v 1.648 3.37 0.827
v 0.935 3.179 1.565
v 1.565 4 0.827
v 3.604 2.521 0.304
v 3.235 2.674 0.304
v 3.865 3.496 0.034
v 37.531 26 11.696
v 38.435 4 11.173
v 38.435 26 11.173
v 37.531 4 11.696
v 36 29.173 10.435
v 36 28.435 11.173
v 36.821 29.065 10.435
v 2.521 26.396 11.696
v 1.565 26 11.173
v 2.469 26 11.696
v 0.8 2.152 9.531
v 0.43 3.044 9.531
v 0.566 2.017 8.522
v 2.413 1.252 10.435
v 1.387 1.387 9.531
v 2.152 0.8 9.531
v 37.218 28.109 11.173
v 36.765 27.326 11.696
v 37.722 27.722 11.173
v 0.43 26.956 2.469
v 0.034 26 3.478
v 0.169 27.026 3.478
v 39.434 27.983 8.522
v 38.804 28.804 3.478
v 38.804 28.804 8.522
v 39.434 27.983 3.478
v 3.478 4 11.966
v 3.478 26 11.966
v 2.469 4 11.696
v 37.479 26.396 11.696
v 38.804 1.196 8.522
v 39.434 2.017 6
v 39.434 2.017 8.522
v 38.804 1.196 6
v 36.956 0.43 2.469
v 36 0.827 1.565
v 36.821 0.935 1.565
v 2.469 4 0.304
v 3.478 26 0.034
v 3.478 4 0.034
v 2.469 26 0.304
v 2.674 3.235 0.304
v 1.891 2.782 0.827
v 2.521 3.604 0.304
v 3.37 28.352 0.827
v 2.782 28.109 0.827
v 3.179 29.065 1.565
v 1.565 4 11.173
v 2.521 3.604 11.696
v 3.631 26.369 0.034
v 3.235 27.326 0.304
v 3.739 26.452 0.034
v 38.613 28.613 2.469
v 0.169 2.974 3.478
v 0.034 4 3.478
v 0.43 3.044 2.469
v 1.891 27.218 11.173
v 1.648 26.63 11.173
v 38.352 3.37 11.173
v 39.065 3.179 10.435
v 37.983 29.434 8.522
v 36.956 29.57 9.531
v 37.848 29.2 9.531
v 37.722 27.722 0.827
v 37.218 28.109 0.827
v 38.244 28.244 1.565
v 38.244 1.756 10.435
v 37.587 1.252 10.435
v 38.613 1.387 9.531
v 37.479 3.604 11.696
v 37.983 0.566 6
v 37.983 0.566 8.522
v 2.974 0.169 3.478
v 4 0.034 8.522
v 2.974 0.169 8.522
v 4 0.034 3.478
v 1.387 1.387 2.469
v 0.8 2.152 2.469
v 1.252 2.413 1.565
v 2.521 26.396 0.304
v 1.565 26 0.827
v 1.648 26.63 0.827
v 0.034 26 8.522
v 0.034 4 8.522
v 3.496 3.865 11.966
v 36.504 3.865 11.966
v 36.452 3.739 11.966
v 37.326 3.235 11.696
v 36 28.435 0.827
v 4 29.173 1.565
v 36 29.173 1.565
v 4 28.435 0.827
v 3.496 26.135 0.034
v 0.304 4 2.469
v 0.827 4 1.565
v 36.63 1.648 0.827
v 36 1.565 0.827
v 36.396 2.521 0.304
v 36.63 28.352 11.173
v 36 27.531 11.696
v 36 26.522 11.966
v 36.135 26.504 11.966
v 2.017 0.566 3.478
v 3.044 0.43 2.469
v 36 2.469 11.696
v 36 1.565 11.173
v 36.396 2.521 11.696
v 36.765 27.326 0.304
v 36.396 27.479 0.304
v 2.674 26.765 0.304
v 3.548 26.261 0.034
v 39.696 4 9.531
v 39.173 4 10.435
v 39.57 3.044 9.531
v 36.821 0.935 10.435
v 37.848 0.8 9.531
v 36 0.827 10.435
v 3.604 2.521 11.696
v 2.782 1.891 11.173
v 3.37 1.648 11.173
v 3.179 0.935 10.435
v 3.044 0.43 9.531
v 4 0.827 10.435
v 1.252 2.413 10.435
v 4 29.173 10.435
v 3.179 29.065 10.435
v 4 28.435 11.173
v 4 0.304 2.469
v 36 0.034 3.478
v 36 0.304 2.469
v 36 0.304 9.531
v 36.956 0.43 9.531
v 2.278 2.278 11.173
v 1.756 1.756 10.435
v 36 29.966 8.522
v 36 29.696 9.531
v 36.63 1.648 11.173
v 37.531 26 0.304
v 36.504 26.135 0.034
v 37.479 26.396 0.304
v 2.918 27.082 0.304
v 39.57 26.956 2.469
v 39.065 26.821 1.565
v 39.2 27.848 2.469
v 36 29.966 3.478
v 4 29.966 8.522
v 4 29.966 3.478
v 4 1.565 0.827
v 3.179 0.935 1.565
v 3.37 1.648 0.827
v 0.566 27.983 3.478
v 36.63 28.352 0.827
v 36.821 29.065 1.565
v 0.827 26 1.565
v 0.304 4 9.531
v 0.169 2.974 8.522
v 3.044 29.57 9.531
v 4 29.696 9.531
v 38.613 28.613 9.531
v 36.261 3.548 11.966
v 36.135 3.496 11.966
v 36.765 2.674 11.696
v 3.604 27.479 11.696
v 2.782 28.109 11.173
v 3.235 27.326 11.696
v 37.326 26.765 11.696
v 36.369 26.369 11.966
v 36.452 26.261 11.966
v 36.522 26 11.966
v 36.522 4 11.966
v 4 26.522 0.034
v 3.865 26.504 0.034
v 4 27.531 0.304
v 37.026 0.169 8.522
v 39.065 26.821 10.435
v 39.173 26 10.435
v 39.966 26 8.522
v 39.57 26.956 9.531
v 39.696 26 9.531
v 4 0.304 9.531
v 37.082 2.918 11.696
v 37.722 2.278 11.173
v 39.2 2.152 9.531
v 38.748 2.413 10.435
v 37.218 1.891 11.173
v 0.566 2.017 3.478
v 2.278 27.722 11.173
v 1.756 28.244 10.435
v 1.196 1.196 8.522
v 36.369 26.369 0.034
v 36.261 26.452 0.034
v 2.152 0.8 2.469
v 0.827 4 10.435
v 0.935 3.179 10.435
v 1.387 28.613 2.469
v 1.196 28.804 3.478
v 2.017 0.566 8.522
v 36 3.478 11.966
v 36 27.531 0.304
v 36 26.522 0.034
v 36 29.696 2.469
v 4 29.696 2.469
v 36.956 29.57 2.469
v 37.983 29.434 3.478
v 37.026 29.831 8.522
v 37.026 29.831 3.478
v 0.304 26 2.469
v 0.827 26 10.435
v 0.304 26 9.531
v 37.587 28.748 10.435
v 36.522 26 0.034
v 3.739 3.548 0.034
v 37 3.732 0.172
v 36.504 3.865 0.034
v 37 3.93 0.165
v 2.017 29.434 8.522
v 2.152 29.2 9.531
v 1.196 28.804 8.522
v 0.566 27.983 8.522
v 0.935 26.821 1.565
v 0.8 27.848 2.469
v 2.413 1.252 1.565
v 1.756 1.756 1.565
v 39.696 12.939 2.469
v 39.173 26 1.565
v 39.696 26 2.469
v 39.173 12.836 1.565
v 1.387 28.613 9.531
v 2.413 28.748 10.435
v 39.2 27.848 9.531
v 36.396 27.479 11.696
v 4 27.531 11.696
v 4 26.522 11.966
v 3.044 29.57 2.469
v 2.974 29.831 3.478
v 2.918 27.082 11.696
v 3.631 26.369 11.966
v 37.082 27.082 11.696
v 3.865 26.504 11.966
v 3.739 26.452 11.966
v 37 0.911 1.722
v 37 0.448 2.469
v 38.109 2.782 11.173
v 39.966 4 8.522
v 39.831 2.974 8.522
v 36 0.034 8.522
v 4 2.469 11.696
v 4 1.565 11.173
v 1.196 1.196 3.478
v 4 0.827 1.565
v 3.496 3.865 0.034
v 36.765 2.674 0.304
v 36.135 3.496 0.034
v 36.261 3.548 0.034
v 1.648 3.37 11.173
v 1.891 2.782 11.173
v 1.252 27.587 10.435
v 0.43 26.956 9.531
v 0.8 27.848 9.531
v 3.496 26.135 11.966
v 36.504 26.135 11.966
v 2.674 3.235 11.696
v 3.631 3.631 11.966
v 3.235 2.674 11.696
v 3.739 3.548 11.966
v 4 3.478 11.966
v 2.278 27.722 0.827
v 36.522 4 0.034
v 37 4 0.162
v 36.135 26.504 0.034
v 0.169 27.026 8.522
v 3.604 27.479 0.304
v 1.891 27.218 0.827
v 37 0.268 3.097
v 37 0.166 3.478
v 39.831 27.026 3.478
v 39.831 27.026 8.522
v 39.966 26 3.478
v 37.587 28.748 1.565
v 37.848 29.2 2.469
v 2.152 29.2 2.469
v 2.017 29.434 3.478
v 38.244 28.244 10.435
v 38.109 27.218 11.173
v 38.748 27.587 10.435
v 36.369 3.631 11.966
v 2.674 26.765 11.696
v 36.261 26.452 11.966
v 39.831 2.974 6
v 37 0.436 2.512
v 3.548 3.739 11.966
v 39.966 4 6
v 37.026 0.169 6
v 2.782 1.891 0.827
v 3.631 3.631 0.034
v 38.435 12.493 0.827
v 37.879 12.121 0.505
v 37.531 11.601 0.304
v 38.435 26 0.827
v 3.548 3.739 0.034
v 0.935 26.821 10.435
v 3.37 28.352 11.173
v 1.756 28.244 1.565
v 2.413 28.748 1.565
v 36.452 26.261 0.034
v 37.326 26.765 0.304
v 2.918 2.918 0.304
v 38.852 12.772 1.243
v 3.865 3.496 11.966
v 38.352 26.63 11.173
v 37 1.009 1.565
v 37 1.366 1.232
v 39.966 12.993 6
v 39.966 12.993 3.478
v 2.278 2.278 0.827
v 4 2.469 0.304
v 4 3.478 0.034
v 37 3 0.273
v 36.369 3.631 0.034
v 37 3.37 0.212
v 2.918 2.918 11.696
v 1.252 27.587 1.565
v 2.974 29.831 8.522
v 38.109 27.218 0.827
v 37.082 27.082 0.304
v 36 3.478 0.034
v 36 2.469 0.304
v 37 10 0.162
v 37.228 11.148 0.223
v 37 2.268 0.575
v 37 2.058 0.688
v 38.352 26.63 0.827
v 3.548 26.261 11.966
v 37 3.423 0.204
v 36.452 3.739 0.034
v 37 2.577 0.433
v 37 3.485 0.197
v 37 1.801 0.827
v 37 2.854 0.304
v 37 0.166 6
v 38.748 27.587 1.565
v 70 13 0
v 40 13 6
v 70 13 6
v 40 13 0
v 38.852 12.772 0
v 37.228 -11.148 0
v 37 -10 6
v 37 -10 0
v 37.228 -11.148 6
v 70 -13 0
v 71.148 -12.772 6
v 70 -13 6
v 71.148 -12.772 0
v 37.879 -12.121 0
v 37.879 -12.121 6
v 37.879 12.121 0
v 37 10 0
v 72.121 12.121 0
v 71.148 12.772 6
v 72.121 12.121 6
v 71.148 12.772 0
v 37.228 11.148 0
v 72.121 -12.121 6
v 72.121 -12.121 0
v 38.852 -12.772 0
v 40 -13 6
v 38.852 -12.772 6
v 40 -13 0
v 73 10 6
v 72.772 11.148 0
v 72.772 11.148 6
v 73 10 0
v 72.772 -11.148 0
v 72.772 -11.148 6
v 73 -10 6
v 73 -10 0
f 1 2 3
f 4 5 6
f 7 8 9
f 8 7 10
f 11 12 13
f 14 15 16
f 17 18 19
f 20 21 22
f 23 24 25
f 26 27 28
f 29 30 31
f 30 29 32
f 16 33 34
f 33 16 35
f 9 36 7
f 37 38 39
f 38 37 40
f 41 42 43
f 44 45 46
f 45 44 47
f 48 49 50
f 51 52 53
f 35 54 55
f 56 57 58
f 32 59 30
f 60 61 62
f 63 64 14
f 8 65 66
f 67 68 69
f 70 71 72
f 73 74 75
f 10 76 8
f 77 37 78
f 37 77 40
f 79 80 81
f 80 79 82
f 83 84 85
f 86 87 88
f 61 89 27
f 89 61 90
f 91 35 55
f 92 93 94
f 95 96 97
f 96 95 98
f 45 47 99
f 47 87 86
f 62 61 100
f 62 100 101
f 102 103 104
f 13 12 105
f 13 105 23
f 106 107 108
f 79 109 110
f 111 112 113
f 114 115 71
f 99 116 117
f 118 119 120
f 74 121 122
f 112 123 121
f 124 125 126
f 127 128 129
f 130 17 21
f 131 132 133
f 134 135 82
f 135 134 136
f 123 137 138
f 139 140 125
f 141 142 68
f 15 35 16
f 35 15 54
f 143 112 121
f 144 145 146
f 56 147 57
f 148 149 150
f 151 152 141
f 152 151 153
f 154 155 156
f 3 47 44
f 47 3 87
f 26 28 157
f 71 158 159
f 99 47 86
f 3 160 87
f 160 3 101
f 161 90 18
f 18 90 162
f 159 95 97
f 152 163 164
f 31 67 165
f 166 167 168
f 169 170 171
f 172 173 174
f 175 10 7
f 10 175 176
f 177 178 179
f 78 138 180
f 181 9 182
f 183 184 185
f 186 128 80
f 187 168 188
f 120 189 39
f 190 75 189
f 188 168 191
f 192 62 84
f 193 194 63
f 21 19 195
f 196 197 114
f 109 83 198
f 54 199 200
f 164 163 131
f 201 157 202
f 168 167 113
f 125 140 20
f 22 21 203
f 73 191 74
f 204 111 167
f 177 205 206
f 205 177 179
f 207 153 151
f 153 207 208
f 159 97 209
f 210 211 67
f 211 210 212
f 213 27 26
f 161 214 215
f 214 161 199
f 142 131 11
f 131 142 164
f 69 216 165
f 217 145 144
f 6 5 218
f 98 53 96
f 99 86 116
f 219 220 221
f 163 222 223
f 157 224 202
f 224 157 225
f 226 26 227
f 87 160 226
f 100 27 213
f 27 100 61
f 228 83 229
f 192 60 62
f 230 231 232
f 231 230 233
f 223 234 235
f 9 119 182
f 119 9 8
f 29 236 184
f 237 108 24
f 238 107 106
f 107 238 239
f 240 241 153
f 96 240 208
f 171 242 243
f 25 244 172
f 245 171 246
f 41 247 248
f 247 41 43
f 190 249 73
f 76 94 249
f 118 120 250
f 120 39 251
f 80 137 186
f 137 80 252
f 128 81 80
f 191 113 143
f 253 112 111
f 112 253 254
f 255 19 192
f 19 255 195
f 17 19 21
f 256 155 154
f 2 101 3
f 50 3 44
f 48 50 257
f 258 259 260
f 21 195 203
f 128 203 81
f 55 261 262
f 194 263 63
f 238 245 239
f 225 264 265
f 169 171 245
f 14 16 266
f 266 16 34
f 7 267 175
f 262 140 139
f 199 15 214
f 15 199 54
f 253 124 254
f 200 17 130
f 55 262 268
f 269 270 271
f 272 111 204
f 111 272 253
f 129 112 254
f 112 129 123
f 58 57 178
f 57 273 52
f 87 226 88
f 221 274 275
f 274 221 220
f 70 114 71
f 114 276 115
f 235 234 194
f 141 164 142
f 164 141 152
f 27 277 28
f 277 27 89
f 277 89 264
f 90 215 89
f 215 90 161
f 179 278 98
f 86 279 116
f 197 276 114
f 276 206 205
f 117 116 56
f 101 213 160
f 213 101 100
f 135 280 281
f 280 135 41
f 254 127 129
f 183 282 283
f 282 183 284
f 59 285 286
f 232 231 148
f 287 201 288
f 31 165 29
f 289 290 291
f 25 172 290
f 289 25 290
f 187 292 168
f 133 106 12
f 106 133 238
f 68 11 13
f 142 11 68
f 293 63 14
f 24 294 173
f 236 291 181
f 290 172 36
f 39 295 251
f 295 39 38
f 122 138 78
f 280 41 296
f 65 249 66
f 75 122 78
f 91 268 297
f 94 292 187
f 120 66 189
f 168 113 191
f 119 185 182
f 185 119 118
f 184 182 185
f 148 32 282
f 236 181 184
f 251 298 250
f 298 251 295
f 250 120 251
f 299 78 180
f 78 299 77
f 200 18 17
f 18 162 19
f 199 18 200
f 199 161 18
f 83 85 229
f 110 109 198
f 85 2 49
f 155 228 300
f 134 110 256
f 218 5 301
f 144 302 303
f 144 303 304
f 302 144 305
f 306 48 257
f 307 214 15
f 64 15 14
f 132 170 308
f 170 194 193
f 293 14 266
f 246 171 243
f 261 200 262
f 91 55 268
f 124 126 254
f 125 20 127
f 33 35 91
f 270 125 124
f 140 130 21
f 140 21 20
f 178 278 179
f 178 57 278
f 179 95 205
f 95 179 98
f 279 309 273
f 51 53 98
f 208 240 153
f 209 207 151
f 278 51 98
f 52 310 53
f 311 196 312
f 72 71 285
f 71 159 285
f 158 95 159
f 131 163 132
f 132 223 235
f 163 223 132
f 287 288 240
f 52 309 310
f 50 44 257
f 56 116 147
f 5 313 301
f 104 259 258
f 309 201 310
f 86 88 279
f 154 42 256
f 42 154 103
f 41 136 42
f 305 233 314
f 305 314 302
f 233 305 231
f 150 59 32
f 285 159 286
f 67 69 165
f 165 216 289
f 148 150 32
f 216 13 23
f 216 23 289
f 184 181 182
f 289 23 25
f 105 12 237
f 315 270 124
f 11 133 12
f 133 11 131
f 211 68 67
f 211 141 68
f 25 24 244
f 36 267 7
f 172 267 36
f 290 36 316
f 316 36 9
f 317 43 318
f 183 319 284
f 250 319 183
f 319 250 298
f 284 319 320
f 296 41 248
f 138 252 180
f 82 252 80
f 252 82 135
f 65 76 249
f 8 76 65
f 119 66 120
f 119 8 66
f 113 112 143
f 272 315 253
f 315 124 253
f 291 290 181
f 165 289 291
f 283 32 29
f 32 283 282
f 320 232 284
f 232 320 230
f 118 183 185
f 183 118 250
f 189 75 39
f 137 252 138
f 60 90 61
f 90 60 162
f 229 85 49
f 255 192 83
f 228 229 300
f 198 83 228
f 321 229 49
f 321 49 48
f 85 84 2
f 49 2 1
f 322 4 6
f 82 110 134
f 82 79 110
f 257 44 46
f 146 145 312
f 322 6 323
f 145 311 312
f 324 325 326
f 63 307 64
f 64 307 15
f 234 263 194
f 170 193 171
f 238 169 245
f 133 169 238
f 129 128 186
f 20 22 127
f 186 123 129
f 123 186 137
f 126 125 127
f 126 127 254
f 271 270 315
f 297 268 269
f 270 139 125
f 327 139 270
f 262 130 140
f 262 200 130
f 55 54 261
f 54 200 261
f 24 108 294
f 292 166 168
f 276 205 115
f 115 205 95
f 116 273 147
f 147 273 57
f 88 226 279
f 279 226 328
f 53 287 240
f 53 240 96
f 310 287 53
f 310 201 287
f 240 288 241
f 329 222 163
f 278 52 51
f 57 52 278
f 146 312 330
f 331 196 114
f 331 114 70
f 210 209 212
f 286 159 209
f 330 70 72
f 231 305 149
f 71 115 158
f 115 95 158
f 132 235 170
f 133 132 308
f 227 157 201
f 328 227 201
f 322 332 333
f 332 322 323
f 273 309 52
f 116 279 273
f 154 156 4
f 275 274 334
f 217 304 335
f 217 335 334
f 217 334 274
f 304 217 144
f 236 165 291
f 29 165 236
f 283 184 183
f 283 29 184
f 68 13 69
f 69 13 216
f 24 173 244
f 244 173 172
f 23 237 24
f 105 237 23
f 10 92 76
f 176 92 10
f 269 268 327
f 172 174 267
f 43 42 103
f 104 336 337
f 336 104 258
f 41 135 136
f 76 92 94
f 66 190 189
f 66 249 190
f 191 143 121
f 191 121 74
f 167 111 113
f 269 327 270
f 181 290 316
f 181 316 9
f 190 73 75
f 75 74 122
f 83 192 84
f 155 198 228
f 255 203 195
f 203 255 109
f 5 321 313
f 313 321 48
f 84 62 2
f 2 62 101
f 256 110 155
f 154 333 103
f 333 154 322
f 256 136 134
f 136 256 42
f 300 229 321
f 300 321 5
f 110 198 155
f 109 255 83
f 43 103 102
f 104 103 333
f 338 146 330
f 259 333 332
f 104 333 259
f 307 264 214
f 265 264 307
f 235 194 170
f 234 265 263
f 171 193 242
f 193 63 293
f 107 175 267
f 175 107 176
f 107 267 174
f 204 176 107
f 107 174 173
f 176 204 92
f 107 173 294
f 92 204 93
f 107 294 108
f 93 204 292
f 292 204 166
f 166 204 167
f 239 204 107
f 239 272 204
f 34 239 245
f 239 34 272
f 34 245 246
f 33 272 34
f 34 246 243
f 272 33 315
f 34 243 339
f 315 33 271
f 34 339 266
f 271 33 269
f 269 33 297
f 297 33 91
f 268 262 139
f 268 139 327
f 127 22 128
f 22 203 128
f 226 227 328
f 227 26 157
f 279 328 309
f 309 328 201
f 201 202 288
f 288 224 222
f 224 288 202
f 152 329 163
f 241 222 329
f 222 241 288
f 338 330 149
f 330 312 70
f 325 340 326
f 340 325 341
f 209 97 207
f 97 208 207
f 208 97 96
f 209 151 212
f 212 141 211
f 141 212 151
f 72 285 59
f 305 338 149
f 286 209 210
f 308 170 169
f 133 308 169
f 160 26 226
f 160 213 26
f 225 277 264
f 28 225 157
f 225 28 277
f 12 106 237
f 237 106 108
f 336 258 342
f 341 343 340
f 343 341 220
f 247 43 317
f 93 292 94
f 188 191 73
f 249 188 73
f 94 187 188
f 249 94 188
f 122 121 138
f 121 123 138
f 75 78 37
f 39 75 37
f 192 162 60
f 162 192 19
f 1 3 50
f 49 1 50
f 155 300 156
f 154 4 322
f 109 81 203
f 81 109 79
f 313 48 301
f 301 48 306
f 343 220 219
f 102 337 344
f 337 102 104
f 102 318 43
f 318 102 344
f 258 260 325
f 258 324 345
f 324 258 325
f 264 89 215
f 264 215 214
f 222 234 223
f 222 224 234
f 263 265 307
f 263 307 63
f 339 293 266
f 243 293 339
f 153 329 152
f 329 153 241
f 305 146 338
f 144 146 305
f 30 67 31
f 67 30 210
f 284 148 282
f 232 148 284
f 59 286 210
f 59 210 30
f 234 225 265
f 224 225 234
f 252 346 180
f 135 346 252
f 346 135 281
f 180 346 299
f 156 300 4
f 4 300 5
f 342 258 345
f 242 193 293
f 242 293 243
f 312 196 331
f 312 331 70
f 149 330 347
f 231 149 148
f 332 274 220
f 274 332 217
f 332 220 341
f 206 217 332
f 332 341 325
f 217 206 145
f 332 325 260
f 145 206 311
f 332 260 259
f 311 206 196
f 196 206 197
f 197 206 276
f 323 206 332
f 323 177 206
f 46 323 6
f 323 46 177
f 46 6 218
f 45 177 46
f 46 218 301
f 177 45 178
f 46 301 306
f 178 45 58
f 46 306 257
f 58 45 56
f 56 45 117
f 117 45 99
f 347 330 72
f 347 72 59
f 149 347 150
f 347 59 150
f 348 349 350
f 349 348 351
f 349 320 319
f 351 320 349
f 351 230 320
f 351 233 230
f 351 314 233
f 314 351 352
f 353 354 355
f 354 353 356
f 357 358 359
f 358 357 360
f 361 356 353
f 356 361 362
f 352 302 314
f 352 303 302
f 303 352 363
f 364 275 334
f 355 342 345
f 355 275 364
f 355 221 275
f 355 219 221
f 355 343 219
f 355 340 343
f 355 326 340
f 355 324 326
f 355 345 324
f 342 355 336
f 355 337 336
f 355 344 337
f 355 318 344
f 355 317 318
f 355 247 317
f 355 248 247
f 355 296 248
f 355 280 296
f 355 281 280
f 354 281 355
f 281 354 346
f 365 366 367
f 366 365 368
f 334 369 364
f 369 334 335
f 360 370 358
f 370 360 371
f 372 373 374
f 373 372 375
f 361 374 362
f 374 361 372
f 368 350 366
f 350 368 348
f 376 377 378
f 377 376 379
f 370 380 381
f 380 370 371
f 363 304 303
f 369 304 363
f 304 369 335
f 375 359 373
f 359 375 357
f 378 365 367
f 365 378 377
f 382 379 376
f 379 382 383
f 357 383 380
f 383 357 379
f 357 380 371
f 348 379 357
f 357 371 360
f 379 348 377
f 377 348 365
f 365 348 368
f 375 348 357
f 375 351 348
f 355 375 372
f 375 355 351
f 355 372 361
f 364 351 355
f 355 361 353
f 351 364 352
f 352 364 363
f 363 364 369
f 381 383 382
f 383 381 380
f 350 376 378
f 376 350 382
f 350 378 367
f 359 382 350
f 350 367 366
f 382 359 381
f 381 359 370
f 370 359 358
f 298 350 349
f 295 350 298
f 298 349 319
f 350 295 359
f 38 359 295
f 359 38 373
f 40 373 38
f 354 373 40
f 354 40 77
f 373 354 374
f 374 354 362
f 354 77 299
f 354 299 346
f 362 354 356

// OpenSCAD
// hull() wraps its children in the tightest convex shell.
// minkowski() sweeps one shape over another -- the usual way to round
// edges, and expensive enough to be worth keeping $fn low.

// A rounded slab, from eight spheres at the corners.
module rounded_box(size, r) {
    hull()
        for (x = [r, size[0] - r], y = [r, size[1] - r], z = [r, size[2] - r])
            translate([x, y, z]) sphere(r, $fn=24);
}

rounded_box([40, 30, 12], 4);

// The same idea with minkowski: a flat profile given a rounded edge.
translate([55, 0, 0])
    minkowski() {
        linear_extrude(4) square([30, 20], center=true);
        cylinder(h=2, r=3, $fn=16);
    }
